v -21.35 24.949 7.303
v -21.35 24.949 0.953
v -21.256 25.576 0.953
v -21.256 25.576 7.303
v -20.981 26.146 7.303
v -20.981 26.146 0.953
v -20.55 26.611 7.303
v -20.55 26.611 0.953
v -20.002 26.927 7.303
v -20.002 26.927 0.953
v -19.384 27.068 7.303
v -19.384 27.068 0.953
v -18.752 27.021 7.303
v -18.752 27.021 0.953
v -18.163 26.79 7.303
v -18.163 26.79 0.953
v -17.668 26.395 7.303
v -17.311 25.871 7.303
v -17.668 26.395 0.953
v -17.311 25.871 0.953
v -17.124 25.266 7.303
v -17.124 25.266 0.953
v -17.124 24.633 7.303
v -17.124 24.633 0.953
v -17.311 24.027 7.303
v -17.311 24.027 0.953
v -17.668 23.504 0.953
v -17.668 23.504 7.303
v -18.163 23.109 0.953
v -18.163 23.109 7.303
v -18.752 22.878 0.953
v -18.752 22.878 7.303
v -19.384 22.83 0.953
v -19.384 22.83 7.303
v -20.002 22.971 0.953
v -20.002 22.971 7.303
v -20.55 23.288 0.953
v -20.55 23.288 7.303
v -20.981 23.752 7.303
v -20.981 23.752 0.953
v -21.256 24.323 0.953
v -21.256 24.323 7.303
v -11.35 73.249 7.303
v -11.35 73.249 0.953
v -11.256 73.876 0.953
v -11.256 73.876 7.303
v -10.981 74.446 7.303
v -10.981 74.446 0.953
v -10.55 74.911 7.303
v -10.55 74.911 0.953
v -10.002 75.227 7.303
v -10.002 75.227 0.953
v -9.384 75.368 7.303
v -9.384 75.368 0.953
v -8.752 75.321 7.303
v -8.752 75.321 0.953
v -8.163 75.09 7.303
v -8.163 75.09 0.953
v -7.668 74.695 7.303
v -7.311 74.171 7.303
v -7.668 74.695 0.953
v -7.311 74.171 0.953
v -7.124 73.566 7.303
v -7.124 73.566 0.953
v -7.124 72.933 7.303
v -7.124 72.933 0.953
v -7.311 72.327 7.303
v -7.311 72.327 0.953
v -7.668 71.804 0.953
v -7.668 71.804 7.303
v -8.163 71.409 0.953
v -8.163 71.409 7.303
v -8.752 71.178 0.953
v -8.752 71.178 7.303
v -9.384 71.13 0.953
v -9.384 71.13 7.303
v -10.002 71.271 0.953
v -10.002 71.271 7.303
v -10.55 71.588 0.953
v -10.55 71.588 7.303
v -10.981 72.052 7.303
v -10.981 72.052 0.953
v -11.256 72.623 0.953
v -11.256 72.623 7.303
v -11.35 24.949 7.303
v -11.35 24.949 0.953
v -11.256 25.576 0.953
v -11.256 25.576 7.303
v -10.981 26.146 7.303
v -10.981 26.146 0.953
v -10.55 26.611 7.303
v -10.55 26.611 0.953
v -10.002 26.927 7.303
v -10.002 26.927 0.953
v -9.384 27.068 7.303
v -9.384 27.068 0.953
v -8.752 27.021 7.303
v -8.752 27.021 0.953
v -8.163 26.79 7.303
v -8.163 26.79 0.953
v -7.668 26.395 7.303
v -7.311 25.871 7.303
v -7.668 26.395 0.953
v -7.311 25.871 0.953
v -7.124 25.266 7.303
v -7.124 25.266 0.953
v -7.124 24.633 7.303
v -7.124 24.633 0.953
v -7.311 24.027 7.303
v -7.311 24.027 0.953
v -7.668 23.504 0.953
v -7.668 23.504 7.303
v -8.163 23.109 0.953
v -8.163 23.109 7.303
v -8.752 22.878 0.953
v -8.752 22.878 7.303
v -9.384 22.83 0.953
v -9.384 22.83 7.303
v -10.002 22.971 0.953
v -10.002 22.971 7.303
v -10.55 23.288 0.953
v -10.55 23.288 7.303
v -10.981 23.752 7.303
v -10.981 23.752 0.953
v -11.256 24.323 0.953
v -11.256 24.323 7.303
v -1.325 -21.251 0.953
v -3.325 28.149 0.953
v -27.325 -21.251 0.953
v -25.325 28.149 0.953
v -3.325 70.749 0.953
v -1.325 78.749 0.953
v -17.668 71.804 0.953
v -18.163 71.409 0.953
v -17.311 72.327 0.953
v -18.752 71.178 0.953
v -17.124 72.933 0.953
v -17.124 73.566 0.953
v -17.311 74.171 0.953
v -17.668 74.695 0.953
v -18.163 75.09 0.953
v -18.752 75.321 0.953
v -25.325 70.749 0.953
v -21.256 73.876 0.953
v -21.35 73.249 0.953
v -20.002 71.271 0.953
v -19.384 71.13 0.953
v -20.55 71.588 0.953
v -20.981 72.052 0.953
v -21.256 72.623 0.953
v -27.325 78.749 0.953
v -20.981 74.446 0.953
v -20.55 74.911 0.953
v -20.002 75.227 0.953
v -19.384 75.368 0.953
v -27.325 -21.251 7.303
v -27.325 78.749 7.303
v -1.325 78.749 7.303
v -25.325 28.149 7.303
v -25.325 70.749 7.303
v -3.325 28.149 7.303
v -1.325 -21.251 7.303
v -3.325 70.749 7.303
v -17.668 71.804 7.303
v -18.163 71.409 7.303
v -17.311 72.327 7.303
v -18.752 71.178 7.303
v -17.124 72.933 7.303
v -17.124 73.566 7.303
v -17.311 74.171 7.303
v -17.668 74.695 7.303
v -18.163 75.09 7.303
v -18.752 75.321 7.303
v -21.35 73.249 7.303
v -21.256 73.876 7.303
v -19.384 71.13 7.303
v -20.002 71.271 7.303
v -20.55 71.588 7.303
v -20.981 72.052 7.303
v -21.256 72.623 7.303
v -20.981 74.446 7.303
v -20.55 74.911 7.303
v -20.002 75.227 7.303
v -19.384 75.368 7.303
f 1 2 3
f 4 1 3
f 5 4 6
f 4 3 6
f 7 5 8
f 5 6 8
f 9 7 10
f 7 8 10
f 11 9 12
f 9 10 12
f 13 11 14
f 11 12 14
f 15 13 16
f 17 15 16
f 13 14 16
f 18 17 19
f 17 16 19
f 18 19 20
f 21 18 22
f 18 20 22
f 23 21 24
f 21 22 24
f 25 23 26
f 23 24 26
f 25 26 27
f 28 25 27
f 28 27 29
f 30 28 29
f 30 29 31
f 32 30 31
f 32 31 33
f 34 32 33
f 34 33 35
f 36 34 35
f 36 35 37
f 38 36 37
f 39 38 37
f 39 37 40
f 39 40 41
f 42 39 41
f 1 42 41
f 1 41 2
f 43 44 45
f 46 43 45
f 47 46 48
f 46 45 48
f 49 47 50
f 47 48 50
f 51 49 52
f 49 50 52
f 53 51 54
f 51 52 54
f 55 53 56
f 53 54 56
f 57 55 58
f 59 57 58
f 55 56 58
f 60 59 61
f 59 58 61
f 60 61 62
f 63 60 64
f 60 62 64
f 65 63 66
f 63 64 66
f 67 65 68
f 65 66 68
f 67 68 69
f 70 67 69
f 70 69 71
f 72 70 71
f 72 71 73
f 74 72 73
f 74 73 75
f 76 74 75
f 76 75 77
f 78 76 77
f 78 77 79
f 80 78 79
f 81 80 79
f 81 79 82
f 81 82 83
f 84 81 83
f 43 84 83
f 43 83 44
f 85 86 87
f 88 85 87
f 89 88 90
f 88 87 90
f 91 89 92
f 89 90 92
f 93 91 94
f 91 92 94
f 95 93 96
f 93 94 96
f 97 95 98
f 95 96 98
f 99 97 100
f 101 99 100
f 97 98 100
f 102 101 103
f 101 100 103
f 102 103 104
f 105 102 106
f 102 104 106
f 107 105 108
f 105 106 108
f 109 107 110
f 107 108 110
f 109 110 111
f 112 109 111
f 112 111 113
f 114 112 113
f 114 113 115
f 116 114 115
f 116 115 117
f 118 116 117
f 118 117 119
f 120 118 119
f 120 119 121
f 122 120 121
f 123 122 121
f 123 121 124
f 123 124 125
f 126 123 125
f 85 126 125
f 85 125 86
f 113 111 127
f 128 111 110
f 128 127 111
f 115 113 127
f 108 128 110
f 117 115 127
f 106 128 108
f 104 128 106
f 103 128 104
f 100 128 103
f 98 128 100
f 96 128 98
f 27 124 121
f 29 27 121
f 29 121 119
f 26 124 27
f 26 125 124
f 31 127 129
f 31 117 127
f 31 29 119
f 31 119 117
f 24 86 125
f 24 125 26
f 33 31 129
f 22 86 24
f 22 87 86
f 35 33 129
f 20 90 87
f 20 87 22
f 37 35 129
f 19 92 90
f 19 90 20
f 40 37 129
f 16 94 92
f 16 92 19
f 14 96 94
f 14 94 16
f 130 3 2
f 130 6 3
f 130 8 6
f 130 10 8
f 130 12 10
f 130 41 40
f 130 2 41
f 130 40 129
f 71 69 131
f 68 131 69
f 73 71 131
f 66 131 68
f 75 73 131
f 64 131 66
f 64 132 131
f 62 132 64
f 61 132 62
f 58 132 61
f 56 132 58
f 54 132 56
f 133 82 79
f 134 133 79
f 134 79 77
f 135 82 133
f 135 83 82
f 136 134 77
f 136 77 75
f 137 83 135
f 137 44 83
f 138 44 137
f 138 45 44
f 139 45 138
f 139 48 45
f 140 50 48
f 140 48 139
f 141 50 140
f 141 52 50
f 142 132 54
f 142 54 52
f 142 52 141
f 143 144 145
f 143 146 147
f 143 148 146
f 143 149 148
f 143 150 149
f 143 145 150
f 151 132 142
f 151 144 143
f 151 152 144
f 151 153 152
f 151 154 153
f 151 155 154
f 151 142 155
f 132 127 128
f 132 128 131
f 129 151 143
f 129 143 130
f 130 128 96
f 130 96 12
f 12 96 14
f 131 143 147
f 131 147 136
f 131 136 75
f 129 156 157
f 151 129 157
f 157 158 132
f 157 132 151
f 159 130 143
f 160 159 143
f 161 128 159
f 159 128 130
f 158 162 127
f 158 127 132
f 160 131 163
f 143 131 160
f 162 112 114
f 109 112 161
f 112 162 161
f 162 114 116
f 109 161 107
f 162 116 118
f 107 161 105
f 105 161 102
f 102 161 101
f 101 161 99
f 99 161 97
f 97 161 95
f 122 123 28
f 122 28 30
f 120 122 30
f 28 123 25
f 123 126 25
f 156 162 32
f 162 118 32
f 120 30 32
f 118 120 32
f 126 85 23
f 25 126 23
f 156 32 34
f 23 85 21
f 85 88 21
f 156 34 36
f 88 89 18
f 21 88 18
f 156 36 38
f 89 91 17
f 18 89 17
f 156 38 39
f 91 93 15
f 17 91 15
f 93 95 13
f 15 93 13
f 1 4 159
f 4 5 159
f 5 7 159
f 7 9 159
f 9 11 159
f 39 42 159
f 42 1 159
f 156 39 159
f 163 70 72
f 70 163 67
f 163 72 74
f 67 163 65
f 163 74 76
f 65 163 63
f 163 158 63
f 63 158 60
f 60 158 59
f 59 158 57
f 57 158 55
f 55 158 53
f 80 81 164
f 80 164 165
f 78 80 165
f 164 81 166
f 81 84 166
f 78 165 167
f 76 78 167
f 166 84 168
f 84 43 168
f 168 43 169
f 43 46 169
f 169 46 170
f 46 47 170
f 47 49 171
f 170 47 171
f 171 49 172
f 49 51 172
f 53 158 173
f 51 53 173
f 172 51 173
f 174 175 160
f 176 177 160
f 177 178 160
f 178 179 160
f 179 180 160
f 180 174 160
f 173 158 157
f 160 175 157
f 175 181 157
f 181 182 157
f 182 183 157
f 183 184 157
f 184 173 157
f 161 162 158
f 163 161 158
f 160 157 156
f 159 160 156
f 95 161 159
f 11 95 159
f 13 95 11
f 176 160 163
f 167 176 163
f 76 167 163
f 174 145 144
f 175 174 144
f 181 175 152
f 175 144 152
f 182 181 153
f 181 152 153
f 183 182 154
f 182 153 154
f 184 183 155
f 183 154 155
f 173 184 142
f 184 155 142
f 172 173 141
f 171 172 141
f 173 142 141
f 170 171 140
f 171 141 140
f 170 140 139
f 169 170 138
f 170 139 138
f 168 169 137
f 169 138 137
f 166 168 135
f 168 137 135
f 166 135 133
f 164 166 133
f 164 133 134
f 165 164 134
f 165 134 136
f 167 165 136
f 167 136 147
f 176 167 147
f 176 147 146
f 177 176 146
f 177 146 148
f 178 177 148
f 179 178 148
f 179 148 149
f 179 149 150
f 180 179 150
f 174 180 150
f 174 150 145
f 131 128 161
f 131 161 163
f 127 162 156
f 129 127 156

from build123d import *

# Parameters (mm, degrees)
SKETCH1_W           = 26
SKETCH1_H           = 100
BOSS_EXTRUDE1_DEPTH = 6.35
SKETCH2_W           = 22
SKETCH2_H           = 42.6
CUT_EXTRUDE1_DEPTH  = 84.596948906
HOLE1_D             = 4.25


with BuildPart() as part:
    # Sketch1 → Boss-Extrude1 (new body)
    with BuildSketch(Plane(origin=(0, 0, 7.302957559), x_dir=(-1, 0, 0), z_dir=(0, 0, -1))):
        with Locations((14.325270249, 28.74932998)):
            Rectangle(SKETCH1_W, SKETCH1_H)
    extrude(amount=BOSS_EXTRUDE1_DEPTH)

    # Sketch2 → Cut-Extrude1 (cut, through all)
    with BuildSketch(Plane(origin=(0, 0, 0.952957559), x_dir=(-1, 0, 0), z_dir=(0, 0, -1))):
        with Locations((14.325270249, 49.44932998)):
            Rectangle(SKETCH2_W, SKETCH2_H)
    extrude(amount=-CUT_EXTRUDE1_DEPTH, mode=Mode.SUBTRACT)

    # Hole1 (through all)
    with Locations(Plane.XY.offset(7.302957559)):
        with Locations((-19.225270249, 73.24932998), (-9.225270249, 73.24932998), (-19.225270249, 24.94932998), (-9.225270249, 24.94932998)):
            Hole(HOLE1_D / 2)


solid = part.part
